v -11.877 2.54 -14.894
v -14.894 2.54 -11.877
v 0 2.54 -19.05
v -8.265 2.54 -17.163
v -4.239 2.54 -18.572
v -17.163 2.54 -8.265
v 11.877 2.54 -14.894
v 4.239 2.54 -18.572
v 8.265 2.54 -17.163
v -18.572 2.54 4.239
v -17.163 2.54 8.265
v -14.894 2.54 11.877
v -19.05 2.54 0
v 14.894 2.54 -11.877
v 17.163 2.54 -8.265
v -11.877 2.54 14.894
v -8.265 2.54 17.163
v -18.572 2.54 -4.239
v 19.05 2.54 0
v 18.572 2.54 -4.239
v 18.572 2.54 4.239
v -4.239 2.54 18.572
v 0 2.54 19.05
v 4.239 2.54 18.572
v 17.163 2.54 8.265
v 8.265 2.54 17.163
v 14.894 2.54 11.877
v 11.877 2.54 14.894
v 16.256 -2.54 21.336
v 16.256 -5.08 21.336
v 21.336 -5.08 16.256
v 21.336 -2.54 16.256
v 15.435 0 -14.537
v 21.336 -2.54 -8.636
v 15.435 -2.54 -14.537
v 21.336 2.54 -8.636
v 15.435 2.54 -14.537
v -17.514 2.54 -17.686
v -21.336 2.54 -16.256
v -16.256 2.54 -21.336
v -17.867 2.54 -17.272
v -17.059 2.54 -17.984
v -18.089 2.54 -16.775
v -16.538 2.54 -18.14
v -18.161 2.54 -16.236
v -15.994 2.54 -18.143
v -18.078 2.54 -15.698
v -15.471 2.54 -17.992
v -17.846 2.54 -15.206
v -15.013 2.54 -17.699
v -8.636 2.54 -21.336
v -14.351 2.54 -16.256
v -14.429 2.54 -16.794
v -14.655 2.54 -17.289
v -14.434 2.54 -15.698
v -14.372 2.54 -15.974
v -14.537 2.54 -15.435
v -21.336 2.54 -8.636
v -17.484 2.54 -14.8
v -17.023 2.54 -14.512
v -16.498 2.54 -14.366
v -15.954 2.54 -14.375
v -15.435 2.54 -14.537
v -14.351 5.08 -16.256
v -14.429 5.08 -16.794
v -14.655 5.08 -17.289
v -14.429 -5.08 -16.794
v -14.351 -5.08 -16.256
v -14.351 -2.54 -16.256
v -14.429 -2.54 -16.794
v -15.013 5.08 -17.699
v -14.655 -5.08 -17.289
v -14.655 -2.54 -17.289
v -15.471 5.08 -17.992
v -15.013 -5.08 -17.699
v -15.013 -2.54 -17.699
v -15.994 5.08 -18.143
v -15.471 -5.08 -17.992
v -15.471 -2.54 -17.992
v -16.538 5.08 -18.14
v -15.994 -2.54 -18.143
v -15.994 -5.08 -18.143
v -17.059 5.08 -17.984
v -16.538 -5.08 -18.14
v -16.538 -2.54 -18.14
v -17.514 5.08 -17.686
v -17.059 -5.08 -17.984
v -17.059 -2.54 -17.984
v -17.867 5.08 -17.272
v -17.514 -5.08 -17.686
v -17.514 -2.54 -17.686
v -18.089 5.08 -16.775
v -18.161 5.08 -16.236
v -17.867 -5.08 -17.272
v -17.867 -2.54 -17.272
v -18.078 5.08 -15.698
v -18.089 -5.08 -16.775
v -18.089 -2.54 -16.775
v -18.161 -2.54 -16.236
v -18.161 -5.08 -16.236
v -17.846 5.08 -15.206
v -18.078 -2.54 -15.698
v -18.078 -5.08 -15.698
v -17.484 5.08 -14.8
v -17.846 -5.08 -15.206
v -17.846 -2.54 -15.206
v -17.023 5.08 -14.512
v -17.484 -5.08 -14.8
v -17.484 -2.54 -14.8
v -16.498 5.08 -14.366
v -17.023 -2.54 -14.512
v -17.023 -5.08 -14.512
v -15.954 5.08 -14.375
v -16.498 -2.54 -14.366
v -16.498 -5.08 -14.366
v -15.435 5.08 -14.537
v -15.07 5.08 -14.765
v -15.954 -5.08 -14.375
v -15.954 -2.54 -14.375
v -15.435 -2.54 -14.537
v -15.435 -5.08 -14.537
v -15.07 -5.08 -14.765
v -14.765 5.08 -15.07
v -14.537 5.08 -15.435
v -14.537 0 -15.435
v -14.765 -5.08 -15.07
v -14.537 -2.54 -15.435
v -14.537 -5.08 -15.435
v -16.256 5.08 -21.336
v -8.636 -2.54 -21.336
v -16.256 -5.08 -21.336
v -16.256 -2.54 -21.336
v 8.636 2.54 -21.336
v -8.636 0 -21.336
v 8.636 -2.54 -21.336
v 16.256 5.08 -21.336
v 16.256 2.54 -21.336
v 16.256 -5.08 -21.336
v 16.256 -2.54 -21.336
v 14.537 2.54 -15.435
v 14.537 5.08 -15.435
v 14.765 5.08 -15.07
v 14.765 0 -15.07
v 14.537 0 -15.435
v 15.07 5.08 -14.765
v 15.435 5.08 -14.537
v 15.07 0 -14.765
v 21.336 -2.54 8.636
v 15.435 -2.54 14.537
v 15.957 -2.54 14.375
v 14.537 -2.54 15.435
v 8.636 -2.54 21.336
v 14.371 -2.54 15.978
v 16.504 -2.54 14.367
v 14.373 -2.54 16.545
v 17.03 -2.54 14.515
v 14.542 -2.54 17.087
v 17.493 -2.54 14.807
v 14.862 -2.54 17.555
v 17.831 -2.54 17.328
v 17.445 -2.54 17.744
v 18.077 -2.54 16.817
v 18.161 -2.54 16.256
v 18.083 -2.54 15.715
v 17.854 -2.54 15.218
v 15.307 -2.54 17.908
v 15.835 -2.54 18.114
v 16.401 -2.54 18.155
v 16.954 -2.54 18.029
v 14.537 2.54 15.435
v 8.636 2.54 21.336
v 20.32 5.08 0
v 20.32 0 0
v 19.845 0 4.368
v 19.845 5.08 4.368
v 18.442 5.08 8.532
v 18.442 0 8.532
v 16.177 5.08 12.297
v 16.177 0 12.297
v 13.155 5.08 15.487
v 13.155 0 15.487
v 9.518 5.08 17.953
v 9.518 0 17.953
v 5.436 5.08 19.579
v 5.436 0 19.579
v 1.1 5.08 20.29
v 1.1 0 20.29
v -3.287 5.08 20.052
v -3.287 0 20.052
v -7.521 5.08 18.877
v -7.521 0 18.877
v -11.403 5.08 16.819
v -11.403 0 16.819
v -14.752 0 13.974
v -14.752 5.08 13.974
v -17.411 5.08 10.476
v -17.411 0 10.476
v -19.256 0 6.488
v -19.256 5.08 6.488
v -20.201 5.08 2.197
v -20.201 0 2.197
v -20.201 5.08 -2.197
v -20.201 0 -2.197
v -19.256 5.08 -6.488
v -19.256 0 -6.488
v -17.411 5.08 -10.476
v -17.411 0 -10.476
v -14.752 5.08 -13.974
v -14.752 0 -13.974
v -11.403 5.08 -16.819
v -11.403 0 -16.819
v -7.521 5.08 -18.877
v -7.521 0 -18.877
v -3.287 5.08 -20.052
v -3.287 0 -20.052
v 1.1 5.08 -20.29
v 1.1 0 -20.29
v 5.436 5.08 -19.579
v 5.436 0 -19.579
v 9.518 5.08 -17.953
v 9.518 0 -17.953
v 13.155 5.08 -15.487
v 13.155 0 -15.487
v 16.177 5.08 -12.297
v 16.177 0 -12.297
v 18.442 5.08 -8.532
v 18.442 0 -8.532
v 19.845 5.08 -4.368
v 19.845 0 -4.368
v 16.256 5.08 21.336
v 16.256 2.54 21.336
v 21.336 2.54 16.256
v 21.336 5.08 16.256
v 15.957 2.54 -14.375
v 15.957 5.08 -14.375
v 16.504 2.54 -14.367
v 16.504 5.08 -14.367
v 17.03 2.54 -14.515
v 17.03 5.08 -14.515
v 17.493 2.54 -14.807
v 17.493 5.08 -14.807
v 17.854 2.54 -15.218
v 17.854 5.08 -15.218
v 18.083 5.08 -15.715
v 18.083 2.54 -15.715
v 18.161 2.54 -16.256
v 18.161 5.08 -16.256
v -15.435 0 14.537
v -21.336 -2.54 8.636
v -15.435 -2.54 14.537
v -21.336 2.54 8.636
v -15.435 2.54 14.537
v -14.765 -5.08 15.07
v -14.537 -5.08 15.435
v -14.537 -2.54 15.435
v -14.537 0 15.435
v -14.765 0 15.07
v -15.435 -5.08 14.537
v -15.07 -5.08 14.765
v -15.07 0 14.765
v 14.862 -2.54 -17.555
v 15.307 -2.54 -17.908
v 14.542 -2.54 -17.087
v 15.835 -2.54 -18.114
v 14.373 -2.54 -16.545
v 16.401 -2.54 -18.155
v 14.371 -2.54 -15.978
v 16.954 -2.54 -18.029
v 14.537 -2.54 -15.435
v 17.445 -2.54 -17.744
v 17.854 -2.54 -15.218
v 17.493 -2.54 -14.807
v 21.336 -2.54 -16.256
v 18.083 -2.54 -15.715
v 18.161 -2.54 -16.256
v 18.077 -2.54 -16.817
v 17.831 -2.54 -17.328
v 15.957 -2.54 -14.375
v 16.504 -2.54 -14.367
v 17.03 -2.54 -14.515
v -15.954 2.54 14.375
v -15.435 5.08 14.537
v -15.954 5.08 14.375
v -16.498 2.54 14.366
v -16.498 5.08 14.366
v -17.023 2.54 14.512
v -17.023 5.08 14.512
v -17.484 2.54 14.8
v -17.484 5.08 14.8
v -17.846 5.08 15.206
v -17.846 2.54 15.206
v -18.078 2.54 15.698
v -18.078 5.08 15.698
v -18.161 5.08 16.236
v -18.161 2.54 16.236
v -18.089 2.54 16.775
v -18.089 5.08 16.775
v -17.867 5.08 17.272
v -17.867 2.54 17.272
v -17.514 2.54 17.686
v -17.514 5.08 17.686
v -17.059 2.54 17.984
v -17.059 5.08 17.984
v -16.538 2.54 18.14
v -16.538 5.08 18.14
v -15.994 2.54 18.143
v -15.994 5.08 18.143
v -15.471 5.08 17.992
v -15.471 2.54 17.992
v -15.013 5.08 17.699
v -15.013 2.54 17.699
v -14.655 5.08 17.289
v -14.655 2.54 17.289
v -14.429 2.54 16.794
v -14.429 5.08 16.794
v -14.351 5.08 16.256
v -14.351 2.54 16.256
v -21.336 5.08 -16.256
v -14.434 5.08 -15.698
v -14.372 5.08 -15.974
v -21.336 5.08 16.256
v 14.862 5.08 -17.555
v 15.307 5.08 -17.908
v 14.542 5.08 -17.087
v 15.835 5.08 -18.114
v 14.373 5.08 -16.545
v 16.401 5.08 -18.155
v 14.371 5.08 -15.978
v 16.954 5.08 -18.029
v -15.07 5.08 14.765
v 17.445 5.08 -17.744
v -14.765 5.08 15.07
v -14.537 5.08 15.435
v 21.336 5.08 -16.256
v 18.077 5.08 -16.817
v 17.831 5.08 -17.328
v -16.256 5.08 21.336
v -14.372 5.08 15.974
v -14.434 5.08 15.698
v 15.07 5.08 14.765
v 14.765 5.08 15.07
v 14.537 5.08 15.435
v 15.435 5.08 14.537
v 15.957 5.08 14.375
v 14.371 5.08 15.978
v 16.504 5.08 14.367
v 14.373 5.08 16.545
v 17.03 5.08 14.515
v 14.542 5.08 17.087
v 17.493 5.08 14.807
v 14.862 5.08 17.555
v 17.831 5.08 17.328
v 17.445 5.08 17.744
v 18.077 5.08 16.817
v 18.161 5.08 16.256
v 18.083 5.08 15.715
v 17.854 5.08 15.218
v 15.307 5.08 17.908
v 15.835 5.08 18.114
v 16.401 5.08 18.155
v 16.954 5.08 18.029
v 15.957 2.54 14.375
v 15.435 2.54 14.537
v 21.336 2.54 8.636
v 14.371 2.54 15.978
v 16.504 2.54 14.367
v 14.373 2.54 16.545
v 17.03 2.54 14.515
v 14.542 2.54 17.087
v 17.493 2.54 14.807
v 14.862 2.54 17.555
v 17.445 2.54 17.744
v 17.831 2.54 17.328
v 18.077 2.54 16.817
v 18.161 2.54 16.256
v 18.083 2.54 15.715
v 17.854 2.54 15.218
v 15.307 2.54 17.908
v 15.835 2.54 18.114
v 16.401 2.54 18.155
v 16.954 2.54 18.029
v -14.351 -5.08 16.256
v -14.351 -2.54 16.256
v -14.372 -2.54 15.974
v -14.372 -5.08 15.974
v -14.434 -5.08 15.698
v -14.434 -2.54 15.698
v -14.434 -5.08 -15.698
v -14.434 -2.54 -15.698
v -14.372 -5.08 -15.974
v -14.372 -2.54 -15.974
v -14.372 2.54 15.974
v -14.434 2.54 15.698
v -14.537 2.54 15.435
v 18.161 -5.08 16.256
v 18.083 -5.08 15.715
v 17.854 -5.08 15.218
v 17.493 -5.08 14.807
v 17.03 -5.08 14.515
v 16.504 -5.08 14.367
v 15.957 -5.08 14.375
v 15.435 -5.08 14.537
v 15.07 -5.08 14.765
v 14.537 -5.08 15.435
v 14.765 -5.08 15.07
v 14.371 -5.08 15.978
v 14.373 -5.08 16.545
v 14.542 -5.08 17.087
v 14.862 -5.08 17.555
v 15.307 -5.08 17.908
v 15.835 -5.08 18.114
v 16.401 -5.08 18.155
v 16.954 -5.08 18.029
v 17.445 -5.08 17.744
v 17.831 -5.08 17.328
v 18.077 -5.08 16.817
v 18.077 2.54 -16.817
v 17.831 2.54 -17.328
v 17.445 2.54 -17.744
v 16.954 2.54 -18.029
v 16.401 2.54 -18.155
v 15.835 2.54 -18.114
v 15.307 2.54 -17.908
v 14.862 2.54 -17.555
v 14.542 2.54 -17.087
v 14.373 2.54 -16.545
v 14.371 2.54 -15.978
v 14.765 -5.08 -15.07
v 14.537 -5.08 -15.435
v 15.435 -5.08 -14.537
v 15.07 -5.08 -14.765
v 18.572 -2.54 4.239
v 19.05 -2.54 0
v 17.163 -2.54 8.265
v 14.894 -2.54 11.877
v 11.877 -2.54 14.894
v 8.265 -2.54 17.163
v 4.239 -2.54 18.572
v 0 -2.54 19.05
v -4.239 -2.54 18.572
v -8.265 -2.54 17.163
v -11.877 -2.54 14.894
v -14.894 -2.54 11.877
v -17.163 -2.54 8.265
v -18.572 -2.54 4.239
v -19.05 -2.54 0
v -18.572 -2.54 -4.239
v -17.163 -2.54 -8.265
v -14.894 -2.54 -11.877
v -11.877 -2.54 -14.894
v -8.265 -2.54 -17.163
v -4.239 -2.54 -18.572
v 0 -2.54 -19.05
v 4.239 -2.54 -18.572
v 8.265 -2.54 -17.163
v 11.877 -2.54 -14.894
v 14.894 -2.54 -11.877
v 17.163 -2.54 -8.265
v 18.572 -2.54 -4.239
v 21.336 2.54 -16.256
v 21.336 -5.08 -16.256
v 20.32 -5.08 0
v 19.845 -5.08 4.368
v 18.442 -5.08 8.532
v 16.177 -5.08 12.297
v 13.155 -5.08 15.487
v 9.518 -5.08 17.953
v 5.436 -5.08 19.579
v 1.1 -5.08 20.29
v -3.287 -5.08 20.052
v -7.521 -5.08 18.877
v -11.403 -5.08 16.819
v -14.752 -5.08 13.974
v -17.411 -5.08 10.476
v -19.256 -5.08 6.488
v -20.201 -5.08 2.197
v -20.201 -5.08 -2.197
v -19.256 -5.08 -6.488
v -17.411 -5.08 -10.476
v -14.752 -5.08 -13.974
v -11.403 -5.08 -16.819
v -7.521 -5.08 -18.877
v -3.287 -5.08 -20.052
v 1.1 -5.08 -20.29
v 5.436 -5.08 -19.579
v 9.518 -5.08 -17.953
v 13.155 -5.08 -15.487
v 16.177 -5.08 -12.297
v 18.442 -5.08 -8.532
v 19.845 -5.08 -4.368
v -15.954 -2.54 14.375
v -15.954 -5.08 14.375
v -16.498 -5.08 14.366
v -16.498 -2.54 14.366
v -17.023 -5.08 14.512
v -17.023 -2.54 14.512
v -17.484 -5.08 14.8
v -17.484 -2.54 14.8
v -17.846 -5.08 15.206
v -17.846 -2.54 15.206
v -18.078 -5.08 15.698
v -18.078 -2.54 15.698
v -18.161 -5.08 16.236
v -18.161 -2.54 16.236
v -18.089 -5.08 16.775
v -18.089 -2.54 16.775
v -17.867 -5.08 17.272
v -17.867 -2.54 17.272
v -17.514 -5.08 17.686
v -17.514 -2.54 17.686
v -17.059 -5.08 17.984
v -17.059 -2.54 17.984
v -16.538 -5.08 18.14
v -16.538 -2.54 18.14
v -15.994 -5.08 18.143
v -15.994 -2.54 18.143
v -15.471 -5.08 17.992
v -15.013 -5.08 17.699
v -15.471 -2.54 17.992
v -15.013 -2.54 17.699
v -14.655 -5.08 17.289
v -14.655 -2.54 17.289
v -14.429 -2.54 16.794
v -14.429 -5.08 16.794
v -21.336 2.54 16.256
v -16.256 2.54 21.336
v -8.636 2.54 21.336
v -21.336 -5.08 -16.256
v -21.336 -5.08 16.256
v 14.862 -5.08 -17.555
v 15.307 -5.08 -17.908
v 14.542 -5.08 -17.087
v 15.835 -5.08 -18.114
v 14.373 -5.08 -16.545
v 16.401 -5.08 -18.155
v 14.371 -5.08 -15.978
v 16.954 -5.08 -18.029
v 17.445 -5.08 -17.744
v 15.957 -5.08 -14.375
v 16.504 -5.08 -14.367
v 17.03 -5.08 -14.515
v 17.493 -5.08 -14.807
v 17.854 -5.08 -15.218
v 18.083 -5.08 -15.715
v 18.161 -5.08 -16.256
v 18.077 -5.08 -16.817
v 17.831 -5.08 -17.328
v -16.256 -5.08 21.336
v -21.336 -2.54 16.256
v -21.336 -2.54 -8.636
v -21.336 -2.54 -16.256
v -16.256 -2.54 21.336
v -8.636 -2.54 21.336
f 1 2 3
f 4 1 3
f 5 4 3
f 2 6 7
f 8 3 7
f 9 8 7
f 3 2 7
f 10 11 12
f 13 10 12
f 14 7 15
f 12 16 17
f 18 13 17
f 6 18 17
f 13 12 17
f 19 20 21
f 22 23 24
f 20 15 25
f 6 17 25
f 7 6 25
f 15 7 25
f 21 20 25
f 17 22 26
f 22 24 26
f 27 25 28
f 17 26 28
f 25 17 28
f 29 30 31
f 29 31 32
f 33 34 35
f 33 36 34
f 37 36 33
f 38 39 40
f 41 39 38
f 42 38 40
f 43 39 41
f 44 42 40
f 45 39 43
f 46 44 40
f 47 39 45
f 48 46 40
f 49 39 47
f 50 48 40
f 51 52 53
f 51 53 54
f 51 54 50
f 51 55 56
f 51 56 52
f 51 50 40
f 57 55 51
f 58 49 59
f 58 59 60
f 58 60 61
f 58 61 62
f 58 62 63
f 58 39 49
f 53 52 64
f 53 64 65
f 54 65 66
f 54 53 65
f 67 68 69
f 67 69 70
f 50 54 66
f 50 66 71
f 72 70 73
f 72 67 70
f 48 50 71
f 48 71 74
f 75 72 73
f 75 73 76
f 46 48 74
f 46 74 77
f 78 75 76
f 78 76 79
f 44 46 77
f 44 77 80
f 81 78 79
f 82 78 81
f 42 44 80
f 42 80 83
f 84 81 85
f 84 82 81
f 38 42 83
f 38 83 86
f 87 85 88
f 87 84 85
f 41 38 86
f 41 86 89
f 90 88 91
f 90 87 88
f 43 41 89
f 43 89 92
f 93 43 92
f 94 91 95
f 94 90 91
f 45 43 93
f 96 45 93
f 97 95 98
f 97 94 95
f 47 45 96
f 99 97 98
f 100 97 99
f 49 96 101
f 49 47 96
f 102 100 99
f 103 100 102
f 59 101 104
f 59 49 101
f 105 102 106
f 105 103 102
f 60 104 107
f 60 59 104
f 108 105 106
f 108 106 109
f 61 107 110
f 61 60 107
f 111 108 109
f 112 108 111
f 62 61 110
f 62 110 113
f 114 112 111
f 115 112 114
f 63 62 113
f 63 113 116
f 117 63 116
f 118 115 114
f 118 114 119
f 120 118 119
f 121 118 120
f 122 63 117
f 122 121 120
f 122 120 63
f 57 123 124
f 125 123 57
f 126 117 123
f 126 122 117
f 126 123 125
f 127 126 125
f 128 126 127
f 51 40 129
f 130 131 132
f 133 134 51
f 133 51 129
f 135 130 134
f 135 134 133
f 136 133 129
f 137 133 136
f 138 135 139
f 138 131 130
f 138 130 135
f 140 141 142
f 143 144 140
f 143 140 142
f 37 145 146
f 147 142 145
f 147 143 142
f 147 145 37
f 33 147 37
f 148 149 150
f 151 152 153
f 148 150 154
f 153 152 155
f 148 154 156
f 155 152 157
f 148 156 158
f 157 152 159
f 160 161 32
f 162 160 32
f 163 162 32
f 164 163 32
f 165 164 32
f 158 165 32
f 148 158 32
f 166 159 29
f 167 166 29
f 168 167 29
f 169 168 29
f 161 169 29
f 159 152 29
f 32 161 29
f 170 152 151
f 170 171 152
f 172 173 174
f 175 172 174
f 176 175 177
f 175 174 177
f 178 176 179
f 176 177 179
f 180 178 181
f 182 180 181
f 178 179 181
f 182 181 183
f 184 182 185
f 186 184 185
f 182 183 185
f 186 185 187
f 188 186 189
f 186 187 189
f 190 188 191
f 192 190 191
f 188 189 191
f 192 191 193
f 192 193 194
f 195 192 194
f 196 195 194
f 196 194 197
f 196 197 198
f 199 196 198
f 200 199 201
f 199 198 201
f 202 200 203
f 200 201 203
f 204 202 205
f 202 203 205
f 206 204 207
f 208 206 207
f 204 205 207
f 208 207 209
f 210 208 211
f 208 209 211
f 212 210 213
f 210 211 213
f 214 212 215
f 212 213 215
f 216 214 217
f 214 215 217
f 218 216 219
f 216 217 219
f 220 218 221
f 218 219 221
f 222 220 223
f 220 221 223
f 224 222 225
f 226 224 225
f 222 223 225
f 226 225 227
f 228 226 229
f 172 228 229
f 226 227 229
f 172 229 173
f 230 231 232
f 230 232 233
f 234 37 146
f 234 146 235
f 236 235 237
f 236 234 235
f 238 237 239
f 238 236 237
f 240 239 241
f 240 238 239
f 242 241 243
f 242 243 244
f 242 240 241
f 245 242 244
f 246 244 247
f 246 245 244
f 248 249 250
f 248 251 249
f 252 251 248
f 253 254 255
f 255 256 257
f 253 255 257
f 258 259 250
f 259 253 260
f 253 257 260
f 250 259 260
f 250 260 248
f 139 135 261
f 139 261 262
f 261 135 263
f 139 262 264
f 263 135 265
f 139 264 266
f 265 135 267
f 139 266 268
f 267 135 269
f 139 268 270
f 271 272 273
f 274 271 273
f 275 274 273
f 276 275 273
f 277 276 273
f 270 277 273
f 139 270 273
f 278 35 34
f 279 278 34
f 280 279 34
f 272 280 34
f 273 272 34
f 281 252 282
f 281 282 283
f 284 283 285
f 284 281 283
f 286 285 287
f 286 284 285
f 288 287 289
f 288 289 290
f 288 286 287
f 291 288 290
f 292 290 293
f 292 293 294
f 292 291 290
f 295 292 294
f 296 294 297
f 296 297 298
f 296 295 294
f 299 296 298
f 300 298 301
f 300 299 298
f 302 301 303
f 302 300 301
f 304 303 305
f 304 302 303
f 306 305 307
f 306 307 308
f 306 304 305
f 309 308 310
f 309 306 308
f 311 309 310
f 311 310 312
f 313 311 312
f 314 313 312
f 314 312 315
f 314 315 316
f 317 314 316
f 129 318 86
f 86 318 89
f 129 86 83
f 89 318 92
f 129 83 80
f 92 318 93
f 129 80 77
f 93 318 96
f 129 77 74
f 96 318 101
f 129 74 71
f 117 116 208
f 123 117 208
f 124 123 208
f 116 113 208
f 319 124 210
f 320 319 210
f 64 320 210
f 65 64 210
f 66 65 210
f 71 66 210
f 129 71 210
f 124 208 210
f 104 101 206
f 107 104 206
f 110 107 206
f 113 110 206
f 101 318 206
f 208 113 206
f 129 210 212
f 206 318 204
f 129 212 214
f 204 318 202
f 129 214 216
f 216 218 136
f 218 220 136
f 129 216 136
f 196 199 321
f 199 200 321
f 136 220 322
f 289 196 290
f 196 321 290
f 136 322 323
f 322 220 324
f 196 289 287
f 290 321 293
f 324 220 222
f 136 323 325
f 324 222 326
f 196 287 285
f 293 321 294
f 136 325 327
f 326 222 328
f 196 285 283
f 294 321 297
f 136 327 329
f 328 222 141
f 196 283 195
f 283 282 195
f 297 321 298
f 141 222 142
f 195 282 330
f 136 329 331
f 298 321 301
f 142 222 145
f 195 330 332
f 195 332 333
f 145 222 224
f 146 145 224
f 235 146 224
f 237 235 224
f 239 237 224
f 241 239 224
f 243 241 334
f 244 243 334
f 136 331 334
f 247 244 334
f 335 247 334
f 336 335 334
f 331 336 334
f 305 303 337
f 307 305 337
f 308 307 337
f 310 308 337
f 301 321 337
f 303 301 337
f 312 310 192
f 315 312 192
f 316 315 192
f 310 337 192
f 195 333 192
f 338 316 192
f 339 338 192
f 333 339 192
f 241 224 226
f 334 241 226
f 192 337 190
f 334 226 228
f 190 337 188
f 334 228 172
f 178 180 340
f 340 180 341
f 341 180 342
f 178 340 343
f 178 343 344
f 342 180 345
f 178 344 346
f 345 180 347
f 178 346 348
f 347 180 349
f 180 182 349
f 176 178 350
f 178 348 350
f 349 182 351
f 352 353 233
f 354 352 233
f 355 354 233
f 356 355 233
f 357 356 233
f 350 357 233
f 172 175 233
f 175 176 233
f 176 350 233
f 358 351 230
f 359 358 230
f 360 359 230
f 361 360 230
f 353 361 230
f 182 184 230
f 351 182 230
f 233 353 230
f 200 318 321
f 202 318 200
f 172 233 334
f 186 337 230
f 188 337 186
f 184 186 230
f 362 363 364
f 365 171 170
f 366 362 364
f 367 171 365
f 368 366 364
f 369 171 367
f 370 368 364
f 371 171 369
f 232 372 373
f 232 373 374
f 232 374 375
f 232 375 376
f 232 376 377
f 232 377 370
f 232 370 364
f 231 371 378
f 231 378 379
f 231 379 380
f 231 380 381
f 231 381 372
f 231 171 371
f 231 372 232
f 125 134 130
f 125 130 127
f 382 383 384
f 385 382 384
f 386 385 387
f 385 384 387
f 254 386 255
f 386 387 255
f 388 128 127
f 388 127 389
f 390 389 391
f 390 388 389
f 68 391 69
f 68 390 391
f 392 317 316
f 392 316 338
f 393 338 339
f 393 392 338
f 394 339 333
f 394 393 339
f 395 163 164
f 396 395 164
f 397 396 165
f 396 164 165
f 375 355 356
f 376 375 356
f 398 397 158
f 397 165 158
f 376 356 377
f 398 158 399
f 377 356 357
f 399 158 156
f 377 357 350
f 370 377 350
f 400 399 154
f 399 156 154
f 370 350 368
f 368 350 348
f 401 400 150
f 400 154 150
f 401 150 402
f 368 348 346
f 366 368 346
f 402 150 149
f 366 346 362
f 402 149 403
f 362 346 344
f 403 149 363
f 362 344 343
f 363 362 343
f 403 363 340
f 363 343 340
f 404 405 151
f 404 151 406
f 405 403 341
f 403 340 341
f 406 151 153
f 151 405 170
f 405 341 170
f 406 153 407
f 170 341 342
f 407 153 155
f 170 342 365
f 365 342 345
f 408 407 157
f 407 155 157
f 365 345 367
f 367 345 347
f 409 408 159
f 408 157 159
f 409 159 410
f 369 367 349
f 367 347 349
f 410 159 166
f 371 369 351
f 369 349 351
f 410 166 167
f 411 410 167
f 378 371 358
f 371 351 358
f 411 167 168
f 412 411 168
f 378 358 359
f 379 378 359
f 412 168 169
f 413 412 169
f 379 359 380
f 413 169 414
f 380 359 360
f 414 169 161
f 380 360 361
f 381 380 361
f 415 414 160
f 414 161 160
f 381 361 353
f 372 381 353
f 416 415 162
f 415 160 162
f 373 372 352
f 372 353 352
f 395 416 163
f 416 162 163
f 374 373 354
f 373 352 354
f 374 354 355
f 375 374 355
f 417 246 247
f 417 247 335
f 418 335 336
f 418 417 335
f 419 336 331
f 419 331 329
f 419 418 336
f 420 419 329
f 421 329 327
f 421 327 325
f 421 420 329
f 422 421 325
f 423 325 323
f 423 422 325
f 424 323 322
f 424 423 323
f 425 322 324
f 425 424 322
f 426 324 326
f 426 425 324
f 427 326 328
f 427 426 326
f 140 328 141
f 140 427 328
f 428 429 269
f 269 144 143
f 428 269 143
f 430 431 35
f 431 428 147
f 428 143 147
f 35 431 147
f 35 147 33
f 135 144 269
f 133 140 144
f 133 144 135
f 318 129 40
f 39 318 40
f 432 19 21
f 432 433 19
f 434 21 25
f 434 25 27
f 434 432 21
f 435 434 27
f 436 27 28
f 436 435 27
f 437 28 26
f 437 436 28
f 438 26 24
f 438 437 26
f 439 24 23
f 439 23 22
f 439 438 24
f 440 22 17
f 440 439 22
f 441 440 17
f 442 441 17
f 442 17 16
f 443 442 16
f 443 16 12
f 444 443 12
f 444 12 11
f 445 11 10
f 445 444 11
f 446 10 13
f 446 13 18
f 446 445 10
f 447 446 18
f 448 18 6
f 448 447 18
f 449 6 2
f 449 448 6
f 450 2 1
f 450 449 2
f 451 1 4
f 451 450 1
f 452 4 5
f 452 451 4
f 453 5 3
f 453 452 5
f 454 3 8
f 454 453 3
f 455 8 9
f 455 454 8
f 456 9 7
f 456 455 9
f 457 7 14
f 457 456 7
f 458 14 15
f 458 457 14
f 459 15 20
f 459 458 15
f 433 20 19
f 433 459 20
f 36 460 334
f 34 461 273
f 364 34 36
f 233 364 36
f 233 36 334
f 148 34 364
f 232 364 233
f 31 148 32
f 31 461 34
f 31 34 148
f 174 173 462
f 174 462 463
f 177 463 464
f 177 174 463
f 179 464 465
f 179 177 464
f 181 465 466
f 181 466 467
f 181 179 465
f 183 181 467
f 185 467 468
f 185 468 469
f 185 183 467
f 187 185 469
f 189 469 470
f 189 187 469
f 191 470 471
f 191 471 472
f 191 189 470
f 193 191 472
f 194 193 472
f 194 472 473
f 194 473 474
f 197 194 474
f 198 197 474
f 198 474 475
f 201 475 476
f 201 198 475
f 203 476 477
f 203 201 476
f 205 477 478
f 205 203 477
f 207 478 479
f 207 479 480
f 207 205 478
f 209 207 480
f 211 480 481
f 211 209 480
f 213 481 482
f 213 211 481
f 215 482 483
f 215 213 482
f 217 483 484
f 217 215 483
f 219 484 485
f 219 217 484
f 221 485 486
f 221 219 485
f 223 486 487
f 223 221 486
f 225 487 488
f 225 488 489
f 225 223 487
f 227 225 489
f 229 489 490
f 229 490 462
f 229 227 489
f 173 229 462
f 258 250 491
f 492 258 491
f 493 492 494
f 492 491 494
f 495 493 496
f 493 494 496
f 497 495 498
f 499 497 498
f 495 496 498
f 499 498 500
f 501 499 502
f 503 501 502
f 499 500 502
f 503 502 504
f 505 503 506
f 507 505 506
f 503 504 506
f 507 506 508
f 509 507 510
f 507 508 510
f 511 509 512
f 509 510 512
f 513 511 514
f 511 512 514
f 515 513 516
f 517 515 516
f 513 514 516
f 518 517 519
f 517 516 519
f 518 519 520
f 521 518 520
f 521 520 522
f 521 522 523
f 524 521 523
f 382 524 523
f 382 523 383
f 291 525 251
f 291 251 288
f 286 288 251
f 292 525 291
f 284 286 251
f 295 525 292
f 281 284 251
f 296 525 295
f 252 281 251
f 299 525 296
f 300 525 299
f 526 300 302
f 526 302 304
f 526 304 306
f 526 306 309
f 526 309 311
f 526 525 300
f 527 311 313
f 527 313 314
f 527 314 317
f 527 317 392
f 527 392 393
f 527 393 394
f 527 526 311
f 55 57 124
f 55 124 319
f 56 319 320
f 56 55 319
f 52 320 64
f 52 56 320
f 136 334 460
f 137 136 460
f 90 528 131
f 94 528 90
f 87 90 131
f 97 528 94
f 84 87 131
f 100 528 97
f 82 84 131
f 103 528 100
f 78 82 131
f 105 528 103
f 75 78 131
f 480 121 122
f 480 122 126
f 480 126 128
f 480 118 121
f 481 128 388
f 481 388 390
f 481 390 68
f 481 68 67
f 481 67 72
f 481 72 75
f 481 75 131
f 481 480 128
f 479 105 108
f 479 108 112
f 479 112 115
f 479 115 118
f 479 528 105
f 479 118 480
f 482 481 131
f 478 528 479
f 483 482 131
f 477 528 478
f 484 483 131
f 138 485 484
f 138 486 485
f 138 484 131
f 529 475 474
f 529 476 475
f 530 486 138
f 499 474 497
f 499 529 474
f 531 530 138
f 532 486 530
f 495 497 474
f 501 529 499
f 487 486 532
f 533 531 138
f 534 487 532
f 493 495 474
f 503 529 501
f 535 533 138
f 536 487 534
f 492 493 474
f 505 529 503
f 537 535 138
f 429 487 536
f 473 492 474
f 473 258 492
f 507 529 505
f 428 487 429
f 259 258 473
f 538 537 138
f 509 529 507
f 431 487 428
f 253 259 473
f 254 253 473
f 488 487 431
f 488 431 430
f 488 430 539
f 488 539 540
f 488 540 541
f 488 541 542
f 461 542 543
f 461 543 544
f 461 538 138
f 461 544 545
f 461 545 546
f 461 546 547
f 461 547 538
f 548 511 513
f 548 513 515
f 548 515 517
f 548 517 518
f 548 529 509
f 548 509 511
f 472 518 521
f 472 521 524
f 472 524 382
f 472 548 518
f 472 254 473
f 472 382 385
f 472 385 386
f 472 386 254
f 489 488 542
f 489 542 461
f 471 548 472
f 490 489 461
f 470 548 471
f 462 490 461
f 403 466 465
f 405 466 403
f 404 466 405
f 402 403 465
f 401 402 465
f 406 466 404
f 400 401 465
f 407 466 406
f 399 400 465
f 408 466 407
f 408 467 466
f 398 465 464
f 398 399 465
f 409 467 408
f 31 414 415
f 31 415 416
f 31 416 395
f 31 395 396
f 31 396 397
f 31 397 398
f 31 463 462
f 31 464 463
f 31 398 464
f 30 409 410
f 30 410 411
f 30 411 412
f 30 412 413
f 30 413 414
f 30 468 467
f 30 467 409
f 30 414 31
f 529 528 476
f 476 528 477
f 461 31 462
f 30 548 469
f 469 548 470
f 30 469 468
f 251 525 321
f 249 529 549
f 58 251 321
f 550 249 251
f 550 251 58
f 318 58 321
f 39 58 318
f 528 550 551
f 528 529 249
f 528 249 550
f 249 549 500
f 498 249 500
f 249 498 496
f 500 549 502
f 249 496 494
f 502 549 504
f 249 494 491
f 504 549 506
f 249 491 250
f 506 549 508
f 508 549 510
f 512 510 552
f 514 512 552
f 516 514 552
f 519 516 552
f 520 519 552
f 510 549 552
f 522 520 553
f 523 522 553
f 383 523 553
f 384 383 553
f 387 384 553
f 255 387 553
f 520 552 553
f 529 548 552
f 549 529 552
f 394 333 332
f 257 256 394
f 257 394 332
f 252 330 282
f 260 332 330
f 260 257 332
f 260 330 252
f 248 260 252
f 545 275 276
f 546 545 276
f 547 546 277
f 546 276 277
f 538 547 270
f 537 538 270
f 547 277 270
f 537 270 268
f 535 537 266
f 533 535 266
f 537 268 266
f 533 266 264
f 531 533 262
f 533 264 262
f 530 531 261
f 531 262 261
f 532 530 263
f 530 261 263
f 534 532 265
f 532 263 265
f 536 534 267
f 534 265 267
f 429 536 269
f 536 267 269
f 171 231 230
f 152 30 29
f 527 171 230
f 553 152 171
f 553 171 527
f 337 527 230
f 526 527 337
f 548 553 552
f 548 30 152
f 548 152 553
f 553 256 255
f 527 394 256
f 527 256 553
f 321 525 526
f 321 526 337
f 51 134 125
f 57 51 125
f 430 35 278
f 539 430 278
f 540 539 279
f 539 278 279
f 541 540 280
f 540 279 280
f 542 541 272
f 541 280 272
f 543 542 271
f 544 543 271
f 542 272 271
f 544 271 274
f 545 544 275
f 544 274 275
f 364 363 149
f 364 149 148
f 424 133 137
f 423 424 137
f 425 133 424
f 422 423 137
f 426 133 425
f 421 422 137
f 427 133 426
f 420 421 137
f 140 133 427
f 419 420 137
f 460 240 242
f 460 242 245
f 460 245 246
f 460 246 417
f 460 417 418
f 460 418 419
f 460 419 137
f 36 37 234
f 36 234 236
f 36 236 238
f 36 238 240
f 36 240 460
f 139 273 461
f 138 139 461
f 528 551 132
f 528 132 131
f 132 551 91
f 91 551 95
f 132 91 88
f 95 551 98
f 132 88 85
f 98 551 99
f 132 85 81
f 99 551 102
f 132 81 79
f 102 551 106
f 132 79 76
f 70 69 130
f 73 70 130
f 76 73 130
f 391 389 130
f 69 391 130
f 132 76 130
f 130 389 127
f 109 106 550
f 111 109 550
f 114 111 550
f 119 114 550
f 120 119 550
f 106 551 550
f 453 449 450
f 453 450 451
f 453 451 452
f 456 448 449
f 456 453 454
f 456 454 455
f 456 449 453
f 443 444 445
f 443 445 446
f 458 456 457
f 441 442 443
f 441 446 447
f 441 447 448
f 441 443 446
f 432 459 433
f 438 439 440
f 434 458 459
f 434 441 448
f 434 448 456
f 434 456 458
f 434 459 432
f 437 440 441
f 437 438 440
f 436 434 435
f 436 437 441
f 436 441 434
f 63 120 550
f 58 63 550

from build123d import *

# Parameters (mm, degrees)
F0_R     = 20.32
F1_DEPTH = 5.08
F2_SIZE  = 5.08
F3_DEPTH = 2.54
F0_R_2   = 19.05
F4_DEPTH = 2.54


with BuildPart() as f1:
    # F0 (on Front) → F1 (new body, symmetric)
    with BuildSketch(Plane.XZ):
        with BuildLine():
            Line((-8.636, 21.336), (-21.336, 21.336))
            Line((-21.336, 21.336), (-21.336, 8.636))
            Line((-21.336, 8.636), (-15.4350128061, 14.5369871939))
            ThreePointArc((-15.4350128061, 14.5369871939), (-17.8673667498, 17.2721309944), (-14.351, 16.256))
            ThreePointArc((-14.351, 16.256), (-14.3980785276, 15.835104761), (-14.5369871939, 15.4350128061))
            Line((-14.5369871939, 15.4350128061), (-8.636, 21.336))
        make_face()
        with BuildLine():
            Line((8.636, 21.336), (-8.636, 21.336))
            Line((-8.636, 21.336), (-14.5369871939, 15.4350128061))
            ThreePointArc((-14.5369871939, 15.4350128061), (-14.9089615818, 14.9089615818), (-15.4350128061, 14.5369871939))
            Line((-15.4350128061, 14.5369871939), (-21.336, 8.636))
            Line((-21.336, 8.636), (-21.336, -8.636))
            Line((-21.336, -8.636), (-15.4350128061, -14.5369871939))
            ThreePointArc((-15.4350128061, -14.5369871939), (-14.9089615818, -14.9089615818), (-14.5369871939, -15.4350128061))
            Line((-14.5369871939, -15.4350128061), (-8.636, -21.336))
            Line((-8.636, -21.336), (8.636, -21.336))
            Line((8.636, -21.336), (14.5369871939, -15.4350128061))
            ThreePointArc((14.5369871939, -15.4350128061), (14.9089615818, -14.9089615818), (15.4350128061, -14.5369871939))
            Line((15.4350128061, -14.5369871939), (21.336, -8.636))
            Line((21.336, -8.636), (21.336, 8.636))
            Line((21.336, 8.636), (15.4350128061, 14.5369871939))
            ThreePointArc((15.4350128061, 14.5369871939), (14.9089615818, 14.9089615818), (14.5369871939, 15.4350128061))
            Line((14.5369871939, 15.4350128061), (8.636, 21.336))
        make_face()
        Circle(F0_R, mode=Mode.SUBTRACT)
        with BuildLine():
            Line((21.336, 21.336), (8.636, 21.336))
            Line((8.636, 21.336), (14.5369871939, 15.4350128061))
            ThreePointArc((14.5369871939, 15.4350128061), (15.835104761, 18.1139214724), (18.161, 16.256))
            ThreePointArc((18.161, 16.256), (17.2721309944, 14.6446332502), (15.4350128061, 14.5369871939))
            Line((15.4350128061, 14.5369871939), (21.336, 8.636))
            Line((21.336, 8.636), (21.336, 21.336))
        make_face()
        with BuildLine():
            Line((8.636, 21.336), (-8.636, 21.336))
            Line((-8.636, 21.336), (-14.5369871939, 15.4350128061))
            ThreePointArc((-14.5369871939, 15.4350128061), (-14.9089615818, 14.9089615818), (-15.4350128061, 14.5369871939))
            Line((-15.4350128061, 14.5369871939), (-21.336, 8.636))
            Line((-21.336, 8.636), (-21.336, -8.636))
            Line((-21.336, -8.636), (-15.4350128061, -14.5369871939))
            ThreePointArc((-15.4350128061, -14.5369871939), (-14.9089615818, -14.9089615818), (-14.5369871939, -15.4350128061))
            Line((-14.5369871939, -15.4350128061), (-8.636, -21.336))
            Line((-8.636, -21.336), (8.636, -21.336))
            Line((8.636, -21.336), (14.5369871939, -15.4350128061))
            ThreePointArc((14.5369871939, -15.4350128061), (14.9089615818, -14.9089615818), (15.4350128061, -14.5369871939))
            Line((15.4350128061, -14.5369871939), (21.336, -8.636))
            Line((21.336, -8.636), (21.336, 8.636))
            Line((21.336, 8.636), (15.4350128061, 14.5369871939))
            ThreePointArc((15.4350128061, 14.5369871939), (14.9089615818, 14.9089615818), (14.5369871939, 15.4350128061))
            Line((14.5369871939, 15.4350128061), (8.636, 21.336))
        make_face()
        Circle(F0_R, mode=Mode.SUBTRACT)
        with BuildLine():
            Line((21.336, -21.336), (21.336, -8.636))
            Line((21.336, -8.636), (15.4350128061, -14.5369871939))
            ThreePointArc((15.4350128061, -14.5369871939), (17.2721309944, -14.6446332502), (18.161, -16.256))
            ThreePointArc((18.161, -16.256), (15.835104761, -18.1139214724), (14.5369871939, -15.4350128061))
            Line((14.5369871939, -15.4350128061), (8.636, -21.336))
            Line((8.636, -21.336), (21.336, -21.336))
        make_face()
        with BuildLine():
            Line((-15.4350128061, -14.5369871939), (-21.336, -8.636))
            Line((-21.336, -8.636), (-21.336, -21.336))
            Line((-21.336, -21.336), (-8.636, -21.336))
            Line((-8.636, -21.336), (-14.5369871939, -15.4350128061))
            ThreePointArc((-14.5369871939, -15.4350128061), (-14.3980785276, -15.835104761), (-14.351, -16.256))
            ThreePointArc((-14.351, -16.256), (-17.8673667498, -17.2721309944), (-15.4350128061, -14.5369871939))
        make_face()
    extrude(amount=F1_DEPTH, both=True)

    # F2
    f2_edges = [f1.edges().sort_by_distance(p)[0] for p in [
        (-21.336, 0, 21.336),
        (-21.336, 0, -21.336),
        (21.336, 0, -21.336),
        (21.336, 0, 21.336),
    ]]
    chamfer(f2_edges, length=F2_SIZE)

    # F0 (on Front) → F3 (cut, symmetric)
    with BuildSketch(Plane.XZ):
        with BuildLine():
            Line((-8.636, 21.336), (-21.336, 21.336))
            Line((-21.336, 21.336), (-21.336, 8.636))
            Line((-21.336, 8.636), (-15.4350128061, 14.5369871939))
            ThreePointArc((-15.4350128061, 14.5369871939), (-17.8673667498, 17.2721309944), (-14.351, 16.256))
            ThreePointArc((-14.351, 16.256), (-14.3980785276, 15.835104761), (-14.5369871939, 15.4350128061))
            Line((-14.5369871939, 15.4350128061), (-8.636, 21.336))
        make_face()
        with BuildLine():
            Line((21.336, 21.336), (8.636, 21.336))
            Line((8.636, 21.336), (14.5369871939, 15.4350128061))
            ThreePointArc((14.5369871939, 15.4350128061), (15.835104761, 18.1139214724), (18.161, 16.256))
            ThreePointArc((18.161, 16.256), (17.2721309944, 14.6446332502), (15.4350128061, 14.5369871939))
            Line((15.4350128061, 14.5369871939), (21.336, 8.636))
            Line((21.336, 8.636), (21.336, 21.336))
        make_face()
        with BuildLine():
            Line((21.336, -21.336), (21.336, -8.636))
            Line((21.336, -8.636), (15.4350128061, -14.5369871939))
            ThreePointArc((15.4350128061, -14.5369871939), (17.2721309944, -14.6446332502), (18.161, -16.256))
            ThreePointArc((18.161, -16.256), (15.835104761, -18.1139214724), (14.5369871939, -15.4350128061))
            Line((14.5369871939, -15.4350128061), (8.636, -21.336))
            Line((8.636, -21.336), (21.336, -21.336))
        make_face()
        with BuildLine():
            Line((-15.4350128061, -14.5369871939), (-21.336, -8.636))
            Line((-21.336, -8.636), (-21.336, -21.336))
            Line((-21.336, -21.336), (-8.636, -21.336))
            Line((-8.636, -21.336), (-14.5369871939, -15.4350128061))
            ThreePointArc((-14.5369871939, -15.4350128061), (-14.3980785276, -15.835104761), (-14.351, -16.256))
            ThreePointArc((-14.351, -16.256), (-17.8673667498, -17.2721309944), (-15.4350128061, -14.5369871939))
        make_face()
    extrude(amount=F3_DEPTH, both=True, mode=Mode.SUBTRACT)


with BuildPart() as f4:
    # F0 (on Front) → F4 (new body, symmetric)
    with BuildSketch(Plane.XZ):
        Circle(F0_R_2)
    extrude(amount=F4_DEPTH, both=True)


solid = Compound([f1.part, f4.part])
